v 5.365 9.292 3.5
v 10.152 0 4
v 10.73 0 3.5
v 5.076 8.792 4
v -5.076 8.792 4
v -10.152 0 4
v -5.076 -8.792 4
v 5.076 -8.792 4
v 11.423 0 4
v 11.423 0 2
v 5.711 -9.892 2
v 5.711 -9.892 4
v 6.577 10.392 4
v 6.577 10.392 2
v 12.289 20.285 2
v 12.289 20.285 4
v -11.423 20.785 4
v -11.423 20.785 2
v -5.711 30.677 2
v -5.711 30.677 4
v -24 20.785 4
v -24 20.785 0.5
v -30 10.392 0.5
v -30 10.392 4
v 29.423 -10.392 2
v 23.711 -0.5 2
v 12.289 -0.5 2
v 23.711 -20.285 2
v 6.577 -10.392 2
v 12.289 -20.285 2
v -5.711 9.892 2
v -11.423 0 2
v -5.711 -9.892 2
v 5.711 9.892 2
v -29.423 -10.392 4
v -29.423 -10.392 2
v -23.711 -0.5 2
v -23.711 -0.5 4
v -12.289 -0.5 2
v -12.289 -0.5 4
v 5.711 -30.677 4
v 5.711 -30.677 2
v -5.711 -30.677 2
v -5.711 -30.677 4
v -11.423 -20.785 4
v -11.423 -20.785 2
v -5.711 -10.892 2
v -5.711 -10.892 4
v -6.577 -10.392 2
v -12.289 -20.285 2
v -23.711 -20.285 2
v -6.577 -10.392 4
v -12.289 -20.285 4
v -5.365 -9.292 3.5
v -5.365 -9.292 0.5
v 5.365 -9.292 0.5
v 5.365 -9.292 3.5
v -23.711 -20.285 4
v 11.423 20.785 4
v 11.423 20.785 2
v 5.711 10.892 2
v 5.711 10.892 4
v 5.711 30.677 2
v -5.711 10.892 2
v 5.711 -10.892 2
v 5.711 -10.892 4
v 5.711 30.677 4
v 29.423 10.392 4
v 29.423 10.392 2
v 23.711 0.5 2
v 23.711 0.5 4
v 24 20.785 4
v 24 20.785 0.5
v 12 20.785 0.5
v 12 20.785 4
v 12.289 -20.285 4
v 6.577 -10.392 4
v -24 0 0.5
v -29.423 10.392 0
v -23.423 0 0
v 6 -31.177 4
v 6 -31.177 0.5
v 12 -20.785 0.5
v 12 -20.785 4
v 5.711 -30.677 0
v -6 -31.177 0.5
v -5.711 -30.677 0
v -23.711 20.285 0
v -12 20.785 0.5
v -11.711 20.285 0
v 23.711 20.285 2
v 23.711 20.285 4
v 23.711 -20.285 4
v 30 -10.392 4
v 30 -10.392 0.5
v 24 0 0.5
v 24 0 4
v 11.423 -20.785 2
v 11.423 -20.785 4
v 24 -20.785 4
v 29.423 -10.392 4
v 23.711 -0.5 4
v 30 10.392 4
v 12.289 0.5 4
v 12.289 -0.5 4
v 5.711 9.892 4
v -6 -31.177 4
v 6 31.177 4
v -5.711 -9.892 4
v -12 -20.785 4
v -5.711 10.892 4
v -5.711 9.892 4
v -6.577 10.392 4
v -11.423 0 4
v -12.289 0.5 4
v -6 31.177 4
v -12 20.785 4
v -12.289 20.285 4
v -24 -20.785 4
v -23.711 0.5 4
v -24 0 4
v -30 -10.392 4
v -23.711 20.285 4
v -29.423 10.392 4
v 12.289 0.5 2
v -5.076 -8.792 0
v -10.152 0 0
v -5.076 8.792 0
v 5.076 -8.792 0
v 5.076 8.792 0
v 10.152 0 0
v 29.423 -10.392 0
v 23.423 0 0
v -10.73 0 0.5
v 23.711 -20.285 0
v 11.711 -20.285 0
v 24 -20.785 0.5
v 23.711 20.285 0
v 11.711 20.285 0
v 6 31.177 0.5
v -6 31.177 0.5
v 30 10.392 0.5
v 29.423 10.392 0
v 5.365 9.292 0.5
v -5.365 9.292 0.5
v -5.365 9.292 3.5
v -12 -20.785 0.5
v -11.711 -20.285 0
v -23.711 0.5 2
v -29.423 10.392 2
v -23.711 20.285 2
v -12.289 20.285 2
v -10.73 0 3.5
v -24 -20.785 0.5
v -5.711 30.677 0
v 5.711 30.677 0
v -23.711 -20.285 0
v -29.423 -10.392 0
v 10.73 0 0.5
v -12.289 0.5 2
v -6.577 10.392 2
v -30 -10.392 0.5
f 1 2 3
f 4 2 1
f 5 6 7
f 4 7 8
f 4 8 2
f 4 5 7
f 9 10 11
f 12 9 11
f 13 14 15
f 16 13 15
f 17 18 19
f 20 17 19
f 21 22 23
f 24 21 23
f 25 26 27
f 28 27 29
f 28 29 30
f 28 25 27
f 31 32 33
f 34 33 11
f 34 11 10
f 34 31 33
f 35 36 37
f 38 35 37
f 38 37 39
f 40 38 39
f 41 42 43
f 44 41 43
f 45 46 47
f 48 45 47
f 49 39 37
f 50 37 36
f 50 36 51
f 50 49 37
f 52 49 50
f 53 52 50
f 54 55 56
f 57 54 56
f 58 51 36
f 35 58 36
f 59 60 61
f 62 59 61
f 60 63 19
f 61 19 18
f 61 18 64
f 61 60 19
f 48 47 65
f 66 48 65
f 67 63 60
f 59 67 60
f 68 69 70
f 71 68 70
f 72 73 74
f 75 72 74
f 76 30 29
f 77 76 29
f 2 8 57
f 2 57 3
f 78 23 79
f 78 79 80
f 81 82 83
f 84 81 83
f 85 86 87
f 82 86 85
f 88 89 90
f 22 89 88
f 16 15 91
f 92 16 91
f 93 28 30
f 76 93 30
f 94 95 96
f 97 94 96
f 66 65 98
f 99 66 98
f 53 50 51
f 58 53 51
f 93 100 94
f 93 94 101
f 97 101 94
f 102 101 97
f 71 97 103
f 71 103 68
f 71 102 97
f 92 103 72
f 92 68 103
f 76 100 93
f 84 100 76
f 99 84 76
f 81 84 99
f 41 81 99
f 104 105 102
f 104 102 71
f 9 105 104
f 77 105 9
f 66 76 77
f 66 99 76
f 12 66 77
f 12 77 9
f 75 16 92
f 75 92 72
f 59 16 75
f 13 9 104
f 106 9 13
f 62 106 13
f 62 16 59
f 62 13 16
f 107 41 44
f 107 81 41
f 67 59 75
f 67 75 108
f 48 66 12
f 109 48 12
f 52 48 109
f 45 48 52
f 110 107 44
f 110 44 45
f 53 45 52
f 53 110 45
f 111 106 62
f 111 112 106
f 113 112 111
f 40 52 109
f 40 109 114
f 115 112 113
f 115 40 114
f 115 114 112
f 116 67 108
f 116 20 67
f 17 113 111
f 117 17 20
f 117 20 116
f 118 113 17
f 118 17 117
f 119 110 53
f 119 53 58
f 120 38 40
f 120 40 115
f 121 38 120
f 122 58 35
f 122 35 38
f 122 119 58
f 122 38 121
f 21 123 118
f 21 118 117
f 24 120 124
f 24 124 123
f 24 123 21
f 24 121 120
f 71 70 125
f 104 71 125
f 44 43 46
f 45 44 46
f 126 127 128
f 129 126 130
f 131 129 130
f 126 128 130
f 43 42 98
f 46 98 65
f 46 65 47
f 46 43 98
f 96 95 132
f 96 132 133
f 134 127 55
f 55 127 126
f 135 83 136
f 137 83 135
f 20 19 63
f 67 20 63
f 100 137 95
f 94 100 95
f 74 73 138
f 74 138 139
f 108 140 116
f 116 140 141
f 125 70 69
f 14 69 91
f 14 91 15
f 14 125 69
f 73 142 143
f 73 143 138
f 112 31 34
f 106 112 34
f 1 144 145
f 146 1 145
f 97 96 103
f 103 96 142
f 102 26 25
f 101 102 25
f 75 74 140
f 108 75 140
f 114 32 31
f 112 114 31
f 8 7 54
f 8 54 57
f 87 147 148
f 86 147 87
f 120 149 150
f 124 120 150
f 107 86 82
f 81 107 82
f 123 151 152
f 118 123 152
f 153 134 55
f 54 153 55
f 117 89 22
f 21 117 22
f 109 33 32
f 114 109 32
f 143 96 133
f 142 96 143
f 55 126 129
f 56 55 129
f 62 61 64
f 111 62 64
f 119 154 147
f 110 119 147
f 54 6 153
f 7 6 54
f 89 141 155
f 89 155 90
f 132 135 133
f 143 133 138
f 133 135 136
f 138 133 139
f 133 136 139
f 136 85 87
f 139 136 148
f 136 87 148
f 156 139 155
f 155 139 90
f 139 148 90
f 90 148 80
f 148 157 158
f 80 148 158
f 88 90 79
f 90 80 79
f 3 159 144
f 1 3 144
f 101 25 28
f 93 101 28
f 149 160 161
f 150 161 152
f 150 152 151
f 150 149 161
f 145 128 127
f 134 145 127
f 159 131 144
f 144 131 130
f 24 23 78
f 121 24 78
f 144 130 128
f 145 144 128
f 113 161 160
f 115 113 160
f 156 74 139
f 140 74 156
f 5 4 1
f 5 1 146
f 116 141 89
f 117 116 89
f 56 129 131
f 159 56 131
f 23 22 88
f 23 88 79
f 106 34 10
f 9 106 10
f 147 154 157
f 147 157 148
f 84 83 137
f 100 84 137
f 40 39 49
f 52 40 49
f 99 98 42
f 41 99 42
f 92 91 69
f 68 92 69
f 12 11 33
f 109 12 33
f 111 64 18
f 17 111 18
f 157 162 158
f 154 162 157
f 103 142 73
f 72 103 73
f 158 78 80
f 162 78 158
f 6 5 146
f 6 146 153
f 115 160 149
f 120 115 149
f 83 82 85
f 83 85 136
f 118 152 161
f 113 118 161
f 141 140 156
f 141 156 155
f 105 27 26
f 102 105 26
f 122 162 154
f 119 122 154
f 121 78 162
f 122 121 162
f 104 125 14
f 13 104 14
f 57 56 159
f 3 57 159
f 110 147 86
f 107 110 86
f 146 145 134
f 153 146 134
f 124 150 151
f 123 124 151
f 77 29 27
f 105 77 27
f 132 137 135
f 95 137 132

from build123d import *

# Parameters (mm, degrees)
F1_DEPTH = 4
F2_DEPTH = 2
F3_COUNT = 3
F4_COUNT = 3
F5_COUNT = 3
F7_SIZE  = 0.5
F9_DEPTH = 4
F10_SIZE = 0.5


with BuildPart() as f1:
    # F0 (on Top) → F1 (new body)
    with BuildSketch(Plane.XY):
        Polygon((-6, -10.3923048454), (6, -10.3923048454), (12, 0), (6, 10.3923048454), (-6, 10.3923048454), (-12, 0), align=None)
        Polygon((5.7113248654, -9.8923048454), (-5.7113248654, -9.8923048454), (-11.4226497308, 0), (-5.7113248654, 9.8923048454), (5.7113248654, 9.8923048454), (11.4226497308, 0), align=None, mode=Mode.SUBTRACT)
    extrude(amount=F1_DEPTH)

    # F0 (on Top) → F2 (join)
    with BuildSketch(Plane.XY):
        Polygon((-11.4226497308, 0), (-5.7113248654, -9.8923048454), (5.7113248654, -9.8923048454), (11.4226497308, 0), (5.7113248654, 9.8923048454), (-5.7113248654, 9.8923048454), align=None)
    extrude(amount=F2_DEPTH)


with BuildPart() as f3_1:
    # F3: instance of F1
    add(f1.part.rotate(Axis((6, -10.3923048454, 2), (0, 0, -1)), 1 * 360 / F3_COUNT))


with BuildPart() as f3_2:
    # F3: instance of F1
    add(f1.part.rotate(Axis((6, -10.3923048454, 2), (0, 0, -1)), 2 * 360 / F3_COUNT))


with BuildPart() as f4_1:
    # F4: instance of F1
    add(f1.part.rotate(Axis((6, 10.3923048454, 2), (0, 0, -1)), 1 * 360 / F4_COUNT))


with BuildPart() as f4_2:
    # F4: instance of F1
    add(f1.part.rotate(Axis((6, 10.3923048454, 2), (0, 0, -1)), 2 * 360 / F4_COUNT))


with BuildPart() as f5_1:
    # F5: instance of F1
    add(f1.part.rotate(Axis((-12, 0, 2), (0, 0, -1)), 1 * 360 / F5_COUNT))


with BuildPart() as f5_2:
    # F5: instance of F1
    add(f1.part.rotate(Axis((-12, 0, 2), (0, 0, -1)), 2 * 360 / F5_COUNT))


with BuildPart() as f1_1:
    add(f1.part)

    # F6: union F3_1, F4_1, F3_2, F5_1, F4_2, F5_2
    add(f3_1.part)
    add(f4_1.part)
    add(f3_2.part)
    add(f5_1.part)
    add(f4_2.part)
    add(f5_2.part)

    # F7
    f7_edges = [f1_1.edges().sort_by_distance(p)[0] for p in [
        (-27, 15.588457, 0),
        (-27, 5.196152, 0),
        (-27, -5.196152, 0),
        (-27, -15.588457, 0),
        (-18, -20.78461, 0),
        (-9, -25.980762, 0),
        (0, -31.176915, 0),
        (9, -25.980762, 0),
        (18, -20.78461, 0),
        (27, -15.588457, 0),
        (27, -5.196152, 0),
        (27, 5.196152, 0),
        (27, 15.588457, 0),
        (18, 20.78461, 0),
        (9, 25.980762, 0),
        (0, 31.176915, 0),
        (-9, 25.980762, 0),
        (-18, 20.78461, 0),
    ]]
    chamfer(f7_edges, length=F7_SIZE)


with BuildPart() as f9:
    # F8 (on Top) → F9 (new body)
    with BuildSketch(Plane.XY):
        Polygon((-10.7298294078, 0), (-5.3649147039, -9.2923048454), (5.3649147039, -9.2923048454), (10.7298294078, 0), (5.3649147039, 9.2923048454), (-5.3649147039, 9.2923048454), align=None)
    extrude(amount=F9_DEPTH)

    # F10
    f10_edges = [f9.edges().sort_by_distance(p)[0] for p in [
        (-8.047372, -4.646152, 4),
        (0, -9.292305, 4),
        (8.047372, -4.646152, 4),
        (8.047372, 4.646152, 4),
        (0, 9.292305, 4),
        (-8.047372, 4.646152, 4),
        (-8.047372, -4.646152, 0),
        (0, -9.292305, 0),
        (8.047372, -4.646152, 0),
        (8.047372, 4.646152, 0),
        (0, 9.292305, 0),
        (-8.047372, 4.646152, 0),
    ]]
    chamfer(f10_edges, length=F10_SIZE)


solid = Compound([f1_1.part, f9.part])
